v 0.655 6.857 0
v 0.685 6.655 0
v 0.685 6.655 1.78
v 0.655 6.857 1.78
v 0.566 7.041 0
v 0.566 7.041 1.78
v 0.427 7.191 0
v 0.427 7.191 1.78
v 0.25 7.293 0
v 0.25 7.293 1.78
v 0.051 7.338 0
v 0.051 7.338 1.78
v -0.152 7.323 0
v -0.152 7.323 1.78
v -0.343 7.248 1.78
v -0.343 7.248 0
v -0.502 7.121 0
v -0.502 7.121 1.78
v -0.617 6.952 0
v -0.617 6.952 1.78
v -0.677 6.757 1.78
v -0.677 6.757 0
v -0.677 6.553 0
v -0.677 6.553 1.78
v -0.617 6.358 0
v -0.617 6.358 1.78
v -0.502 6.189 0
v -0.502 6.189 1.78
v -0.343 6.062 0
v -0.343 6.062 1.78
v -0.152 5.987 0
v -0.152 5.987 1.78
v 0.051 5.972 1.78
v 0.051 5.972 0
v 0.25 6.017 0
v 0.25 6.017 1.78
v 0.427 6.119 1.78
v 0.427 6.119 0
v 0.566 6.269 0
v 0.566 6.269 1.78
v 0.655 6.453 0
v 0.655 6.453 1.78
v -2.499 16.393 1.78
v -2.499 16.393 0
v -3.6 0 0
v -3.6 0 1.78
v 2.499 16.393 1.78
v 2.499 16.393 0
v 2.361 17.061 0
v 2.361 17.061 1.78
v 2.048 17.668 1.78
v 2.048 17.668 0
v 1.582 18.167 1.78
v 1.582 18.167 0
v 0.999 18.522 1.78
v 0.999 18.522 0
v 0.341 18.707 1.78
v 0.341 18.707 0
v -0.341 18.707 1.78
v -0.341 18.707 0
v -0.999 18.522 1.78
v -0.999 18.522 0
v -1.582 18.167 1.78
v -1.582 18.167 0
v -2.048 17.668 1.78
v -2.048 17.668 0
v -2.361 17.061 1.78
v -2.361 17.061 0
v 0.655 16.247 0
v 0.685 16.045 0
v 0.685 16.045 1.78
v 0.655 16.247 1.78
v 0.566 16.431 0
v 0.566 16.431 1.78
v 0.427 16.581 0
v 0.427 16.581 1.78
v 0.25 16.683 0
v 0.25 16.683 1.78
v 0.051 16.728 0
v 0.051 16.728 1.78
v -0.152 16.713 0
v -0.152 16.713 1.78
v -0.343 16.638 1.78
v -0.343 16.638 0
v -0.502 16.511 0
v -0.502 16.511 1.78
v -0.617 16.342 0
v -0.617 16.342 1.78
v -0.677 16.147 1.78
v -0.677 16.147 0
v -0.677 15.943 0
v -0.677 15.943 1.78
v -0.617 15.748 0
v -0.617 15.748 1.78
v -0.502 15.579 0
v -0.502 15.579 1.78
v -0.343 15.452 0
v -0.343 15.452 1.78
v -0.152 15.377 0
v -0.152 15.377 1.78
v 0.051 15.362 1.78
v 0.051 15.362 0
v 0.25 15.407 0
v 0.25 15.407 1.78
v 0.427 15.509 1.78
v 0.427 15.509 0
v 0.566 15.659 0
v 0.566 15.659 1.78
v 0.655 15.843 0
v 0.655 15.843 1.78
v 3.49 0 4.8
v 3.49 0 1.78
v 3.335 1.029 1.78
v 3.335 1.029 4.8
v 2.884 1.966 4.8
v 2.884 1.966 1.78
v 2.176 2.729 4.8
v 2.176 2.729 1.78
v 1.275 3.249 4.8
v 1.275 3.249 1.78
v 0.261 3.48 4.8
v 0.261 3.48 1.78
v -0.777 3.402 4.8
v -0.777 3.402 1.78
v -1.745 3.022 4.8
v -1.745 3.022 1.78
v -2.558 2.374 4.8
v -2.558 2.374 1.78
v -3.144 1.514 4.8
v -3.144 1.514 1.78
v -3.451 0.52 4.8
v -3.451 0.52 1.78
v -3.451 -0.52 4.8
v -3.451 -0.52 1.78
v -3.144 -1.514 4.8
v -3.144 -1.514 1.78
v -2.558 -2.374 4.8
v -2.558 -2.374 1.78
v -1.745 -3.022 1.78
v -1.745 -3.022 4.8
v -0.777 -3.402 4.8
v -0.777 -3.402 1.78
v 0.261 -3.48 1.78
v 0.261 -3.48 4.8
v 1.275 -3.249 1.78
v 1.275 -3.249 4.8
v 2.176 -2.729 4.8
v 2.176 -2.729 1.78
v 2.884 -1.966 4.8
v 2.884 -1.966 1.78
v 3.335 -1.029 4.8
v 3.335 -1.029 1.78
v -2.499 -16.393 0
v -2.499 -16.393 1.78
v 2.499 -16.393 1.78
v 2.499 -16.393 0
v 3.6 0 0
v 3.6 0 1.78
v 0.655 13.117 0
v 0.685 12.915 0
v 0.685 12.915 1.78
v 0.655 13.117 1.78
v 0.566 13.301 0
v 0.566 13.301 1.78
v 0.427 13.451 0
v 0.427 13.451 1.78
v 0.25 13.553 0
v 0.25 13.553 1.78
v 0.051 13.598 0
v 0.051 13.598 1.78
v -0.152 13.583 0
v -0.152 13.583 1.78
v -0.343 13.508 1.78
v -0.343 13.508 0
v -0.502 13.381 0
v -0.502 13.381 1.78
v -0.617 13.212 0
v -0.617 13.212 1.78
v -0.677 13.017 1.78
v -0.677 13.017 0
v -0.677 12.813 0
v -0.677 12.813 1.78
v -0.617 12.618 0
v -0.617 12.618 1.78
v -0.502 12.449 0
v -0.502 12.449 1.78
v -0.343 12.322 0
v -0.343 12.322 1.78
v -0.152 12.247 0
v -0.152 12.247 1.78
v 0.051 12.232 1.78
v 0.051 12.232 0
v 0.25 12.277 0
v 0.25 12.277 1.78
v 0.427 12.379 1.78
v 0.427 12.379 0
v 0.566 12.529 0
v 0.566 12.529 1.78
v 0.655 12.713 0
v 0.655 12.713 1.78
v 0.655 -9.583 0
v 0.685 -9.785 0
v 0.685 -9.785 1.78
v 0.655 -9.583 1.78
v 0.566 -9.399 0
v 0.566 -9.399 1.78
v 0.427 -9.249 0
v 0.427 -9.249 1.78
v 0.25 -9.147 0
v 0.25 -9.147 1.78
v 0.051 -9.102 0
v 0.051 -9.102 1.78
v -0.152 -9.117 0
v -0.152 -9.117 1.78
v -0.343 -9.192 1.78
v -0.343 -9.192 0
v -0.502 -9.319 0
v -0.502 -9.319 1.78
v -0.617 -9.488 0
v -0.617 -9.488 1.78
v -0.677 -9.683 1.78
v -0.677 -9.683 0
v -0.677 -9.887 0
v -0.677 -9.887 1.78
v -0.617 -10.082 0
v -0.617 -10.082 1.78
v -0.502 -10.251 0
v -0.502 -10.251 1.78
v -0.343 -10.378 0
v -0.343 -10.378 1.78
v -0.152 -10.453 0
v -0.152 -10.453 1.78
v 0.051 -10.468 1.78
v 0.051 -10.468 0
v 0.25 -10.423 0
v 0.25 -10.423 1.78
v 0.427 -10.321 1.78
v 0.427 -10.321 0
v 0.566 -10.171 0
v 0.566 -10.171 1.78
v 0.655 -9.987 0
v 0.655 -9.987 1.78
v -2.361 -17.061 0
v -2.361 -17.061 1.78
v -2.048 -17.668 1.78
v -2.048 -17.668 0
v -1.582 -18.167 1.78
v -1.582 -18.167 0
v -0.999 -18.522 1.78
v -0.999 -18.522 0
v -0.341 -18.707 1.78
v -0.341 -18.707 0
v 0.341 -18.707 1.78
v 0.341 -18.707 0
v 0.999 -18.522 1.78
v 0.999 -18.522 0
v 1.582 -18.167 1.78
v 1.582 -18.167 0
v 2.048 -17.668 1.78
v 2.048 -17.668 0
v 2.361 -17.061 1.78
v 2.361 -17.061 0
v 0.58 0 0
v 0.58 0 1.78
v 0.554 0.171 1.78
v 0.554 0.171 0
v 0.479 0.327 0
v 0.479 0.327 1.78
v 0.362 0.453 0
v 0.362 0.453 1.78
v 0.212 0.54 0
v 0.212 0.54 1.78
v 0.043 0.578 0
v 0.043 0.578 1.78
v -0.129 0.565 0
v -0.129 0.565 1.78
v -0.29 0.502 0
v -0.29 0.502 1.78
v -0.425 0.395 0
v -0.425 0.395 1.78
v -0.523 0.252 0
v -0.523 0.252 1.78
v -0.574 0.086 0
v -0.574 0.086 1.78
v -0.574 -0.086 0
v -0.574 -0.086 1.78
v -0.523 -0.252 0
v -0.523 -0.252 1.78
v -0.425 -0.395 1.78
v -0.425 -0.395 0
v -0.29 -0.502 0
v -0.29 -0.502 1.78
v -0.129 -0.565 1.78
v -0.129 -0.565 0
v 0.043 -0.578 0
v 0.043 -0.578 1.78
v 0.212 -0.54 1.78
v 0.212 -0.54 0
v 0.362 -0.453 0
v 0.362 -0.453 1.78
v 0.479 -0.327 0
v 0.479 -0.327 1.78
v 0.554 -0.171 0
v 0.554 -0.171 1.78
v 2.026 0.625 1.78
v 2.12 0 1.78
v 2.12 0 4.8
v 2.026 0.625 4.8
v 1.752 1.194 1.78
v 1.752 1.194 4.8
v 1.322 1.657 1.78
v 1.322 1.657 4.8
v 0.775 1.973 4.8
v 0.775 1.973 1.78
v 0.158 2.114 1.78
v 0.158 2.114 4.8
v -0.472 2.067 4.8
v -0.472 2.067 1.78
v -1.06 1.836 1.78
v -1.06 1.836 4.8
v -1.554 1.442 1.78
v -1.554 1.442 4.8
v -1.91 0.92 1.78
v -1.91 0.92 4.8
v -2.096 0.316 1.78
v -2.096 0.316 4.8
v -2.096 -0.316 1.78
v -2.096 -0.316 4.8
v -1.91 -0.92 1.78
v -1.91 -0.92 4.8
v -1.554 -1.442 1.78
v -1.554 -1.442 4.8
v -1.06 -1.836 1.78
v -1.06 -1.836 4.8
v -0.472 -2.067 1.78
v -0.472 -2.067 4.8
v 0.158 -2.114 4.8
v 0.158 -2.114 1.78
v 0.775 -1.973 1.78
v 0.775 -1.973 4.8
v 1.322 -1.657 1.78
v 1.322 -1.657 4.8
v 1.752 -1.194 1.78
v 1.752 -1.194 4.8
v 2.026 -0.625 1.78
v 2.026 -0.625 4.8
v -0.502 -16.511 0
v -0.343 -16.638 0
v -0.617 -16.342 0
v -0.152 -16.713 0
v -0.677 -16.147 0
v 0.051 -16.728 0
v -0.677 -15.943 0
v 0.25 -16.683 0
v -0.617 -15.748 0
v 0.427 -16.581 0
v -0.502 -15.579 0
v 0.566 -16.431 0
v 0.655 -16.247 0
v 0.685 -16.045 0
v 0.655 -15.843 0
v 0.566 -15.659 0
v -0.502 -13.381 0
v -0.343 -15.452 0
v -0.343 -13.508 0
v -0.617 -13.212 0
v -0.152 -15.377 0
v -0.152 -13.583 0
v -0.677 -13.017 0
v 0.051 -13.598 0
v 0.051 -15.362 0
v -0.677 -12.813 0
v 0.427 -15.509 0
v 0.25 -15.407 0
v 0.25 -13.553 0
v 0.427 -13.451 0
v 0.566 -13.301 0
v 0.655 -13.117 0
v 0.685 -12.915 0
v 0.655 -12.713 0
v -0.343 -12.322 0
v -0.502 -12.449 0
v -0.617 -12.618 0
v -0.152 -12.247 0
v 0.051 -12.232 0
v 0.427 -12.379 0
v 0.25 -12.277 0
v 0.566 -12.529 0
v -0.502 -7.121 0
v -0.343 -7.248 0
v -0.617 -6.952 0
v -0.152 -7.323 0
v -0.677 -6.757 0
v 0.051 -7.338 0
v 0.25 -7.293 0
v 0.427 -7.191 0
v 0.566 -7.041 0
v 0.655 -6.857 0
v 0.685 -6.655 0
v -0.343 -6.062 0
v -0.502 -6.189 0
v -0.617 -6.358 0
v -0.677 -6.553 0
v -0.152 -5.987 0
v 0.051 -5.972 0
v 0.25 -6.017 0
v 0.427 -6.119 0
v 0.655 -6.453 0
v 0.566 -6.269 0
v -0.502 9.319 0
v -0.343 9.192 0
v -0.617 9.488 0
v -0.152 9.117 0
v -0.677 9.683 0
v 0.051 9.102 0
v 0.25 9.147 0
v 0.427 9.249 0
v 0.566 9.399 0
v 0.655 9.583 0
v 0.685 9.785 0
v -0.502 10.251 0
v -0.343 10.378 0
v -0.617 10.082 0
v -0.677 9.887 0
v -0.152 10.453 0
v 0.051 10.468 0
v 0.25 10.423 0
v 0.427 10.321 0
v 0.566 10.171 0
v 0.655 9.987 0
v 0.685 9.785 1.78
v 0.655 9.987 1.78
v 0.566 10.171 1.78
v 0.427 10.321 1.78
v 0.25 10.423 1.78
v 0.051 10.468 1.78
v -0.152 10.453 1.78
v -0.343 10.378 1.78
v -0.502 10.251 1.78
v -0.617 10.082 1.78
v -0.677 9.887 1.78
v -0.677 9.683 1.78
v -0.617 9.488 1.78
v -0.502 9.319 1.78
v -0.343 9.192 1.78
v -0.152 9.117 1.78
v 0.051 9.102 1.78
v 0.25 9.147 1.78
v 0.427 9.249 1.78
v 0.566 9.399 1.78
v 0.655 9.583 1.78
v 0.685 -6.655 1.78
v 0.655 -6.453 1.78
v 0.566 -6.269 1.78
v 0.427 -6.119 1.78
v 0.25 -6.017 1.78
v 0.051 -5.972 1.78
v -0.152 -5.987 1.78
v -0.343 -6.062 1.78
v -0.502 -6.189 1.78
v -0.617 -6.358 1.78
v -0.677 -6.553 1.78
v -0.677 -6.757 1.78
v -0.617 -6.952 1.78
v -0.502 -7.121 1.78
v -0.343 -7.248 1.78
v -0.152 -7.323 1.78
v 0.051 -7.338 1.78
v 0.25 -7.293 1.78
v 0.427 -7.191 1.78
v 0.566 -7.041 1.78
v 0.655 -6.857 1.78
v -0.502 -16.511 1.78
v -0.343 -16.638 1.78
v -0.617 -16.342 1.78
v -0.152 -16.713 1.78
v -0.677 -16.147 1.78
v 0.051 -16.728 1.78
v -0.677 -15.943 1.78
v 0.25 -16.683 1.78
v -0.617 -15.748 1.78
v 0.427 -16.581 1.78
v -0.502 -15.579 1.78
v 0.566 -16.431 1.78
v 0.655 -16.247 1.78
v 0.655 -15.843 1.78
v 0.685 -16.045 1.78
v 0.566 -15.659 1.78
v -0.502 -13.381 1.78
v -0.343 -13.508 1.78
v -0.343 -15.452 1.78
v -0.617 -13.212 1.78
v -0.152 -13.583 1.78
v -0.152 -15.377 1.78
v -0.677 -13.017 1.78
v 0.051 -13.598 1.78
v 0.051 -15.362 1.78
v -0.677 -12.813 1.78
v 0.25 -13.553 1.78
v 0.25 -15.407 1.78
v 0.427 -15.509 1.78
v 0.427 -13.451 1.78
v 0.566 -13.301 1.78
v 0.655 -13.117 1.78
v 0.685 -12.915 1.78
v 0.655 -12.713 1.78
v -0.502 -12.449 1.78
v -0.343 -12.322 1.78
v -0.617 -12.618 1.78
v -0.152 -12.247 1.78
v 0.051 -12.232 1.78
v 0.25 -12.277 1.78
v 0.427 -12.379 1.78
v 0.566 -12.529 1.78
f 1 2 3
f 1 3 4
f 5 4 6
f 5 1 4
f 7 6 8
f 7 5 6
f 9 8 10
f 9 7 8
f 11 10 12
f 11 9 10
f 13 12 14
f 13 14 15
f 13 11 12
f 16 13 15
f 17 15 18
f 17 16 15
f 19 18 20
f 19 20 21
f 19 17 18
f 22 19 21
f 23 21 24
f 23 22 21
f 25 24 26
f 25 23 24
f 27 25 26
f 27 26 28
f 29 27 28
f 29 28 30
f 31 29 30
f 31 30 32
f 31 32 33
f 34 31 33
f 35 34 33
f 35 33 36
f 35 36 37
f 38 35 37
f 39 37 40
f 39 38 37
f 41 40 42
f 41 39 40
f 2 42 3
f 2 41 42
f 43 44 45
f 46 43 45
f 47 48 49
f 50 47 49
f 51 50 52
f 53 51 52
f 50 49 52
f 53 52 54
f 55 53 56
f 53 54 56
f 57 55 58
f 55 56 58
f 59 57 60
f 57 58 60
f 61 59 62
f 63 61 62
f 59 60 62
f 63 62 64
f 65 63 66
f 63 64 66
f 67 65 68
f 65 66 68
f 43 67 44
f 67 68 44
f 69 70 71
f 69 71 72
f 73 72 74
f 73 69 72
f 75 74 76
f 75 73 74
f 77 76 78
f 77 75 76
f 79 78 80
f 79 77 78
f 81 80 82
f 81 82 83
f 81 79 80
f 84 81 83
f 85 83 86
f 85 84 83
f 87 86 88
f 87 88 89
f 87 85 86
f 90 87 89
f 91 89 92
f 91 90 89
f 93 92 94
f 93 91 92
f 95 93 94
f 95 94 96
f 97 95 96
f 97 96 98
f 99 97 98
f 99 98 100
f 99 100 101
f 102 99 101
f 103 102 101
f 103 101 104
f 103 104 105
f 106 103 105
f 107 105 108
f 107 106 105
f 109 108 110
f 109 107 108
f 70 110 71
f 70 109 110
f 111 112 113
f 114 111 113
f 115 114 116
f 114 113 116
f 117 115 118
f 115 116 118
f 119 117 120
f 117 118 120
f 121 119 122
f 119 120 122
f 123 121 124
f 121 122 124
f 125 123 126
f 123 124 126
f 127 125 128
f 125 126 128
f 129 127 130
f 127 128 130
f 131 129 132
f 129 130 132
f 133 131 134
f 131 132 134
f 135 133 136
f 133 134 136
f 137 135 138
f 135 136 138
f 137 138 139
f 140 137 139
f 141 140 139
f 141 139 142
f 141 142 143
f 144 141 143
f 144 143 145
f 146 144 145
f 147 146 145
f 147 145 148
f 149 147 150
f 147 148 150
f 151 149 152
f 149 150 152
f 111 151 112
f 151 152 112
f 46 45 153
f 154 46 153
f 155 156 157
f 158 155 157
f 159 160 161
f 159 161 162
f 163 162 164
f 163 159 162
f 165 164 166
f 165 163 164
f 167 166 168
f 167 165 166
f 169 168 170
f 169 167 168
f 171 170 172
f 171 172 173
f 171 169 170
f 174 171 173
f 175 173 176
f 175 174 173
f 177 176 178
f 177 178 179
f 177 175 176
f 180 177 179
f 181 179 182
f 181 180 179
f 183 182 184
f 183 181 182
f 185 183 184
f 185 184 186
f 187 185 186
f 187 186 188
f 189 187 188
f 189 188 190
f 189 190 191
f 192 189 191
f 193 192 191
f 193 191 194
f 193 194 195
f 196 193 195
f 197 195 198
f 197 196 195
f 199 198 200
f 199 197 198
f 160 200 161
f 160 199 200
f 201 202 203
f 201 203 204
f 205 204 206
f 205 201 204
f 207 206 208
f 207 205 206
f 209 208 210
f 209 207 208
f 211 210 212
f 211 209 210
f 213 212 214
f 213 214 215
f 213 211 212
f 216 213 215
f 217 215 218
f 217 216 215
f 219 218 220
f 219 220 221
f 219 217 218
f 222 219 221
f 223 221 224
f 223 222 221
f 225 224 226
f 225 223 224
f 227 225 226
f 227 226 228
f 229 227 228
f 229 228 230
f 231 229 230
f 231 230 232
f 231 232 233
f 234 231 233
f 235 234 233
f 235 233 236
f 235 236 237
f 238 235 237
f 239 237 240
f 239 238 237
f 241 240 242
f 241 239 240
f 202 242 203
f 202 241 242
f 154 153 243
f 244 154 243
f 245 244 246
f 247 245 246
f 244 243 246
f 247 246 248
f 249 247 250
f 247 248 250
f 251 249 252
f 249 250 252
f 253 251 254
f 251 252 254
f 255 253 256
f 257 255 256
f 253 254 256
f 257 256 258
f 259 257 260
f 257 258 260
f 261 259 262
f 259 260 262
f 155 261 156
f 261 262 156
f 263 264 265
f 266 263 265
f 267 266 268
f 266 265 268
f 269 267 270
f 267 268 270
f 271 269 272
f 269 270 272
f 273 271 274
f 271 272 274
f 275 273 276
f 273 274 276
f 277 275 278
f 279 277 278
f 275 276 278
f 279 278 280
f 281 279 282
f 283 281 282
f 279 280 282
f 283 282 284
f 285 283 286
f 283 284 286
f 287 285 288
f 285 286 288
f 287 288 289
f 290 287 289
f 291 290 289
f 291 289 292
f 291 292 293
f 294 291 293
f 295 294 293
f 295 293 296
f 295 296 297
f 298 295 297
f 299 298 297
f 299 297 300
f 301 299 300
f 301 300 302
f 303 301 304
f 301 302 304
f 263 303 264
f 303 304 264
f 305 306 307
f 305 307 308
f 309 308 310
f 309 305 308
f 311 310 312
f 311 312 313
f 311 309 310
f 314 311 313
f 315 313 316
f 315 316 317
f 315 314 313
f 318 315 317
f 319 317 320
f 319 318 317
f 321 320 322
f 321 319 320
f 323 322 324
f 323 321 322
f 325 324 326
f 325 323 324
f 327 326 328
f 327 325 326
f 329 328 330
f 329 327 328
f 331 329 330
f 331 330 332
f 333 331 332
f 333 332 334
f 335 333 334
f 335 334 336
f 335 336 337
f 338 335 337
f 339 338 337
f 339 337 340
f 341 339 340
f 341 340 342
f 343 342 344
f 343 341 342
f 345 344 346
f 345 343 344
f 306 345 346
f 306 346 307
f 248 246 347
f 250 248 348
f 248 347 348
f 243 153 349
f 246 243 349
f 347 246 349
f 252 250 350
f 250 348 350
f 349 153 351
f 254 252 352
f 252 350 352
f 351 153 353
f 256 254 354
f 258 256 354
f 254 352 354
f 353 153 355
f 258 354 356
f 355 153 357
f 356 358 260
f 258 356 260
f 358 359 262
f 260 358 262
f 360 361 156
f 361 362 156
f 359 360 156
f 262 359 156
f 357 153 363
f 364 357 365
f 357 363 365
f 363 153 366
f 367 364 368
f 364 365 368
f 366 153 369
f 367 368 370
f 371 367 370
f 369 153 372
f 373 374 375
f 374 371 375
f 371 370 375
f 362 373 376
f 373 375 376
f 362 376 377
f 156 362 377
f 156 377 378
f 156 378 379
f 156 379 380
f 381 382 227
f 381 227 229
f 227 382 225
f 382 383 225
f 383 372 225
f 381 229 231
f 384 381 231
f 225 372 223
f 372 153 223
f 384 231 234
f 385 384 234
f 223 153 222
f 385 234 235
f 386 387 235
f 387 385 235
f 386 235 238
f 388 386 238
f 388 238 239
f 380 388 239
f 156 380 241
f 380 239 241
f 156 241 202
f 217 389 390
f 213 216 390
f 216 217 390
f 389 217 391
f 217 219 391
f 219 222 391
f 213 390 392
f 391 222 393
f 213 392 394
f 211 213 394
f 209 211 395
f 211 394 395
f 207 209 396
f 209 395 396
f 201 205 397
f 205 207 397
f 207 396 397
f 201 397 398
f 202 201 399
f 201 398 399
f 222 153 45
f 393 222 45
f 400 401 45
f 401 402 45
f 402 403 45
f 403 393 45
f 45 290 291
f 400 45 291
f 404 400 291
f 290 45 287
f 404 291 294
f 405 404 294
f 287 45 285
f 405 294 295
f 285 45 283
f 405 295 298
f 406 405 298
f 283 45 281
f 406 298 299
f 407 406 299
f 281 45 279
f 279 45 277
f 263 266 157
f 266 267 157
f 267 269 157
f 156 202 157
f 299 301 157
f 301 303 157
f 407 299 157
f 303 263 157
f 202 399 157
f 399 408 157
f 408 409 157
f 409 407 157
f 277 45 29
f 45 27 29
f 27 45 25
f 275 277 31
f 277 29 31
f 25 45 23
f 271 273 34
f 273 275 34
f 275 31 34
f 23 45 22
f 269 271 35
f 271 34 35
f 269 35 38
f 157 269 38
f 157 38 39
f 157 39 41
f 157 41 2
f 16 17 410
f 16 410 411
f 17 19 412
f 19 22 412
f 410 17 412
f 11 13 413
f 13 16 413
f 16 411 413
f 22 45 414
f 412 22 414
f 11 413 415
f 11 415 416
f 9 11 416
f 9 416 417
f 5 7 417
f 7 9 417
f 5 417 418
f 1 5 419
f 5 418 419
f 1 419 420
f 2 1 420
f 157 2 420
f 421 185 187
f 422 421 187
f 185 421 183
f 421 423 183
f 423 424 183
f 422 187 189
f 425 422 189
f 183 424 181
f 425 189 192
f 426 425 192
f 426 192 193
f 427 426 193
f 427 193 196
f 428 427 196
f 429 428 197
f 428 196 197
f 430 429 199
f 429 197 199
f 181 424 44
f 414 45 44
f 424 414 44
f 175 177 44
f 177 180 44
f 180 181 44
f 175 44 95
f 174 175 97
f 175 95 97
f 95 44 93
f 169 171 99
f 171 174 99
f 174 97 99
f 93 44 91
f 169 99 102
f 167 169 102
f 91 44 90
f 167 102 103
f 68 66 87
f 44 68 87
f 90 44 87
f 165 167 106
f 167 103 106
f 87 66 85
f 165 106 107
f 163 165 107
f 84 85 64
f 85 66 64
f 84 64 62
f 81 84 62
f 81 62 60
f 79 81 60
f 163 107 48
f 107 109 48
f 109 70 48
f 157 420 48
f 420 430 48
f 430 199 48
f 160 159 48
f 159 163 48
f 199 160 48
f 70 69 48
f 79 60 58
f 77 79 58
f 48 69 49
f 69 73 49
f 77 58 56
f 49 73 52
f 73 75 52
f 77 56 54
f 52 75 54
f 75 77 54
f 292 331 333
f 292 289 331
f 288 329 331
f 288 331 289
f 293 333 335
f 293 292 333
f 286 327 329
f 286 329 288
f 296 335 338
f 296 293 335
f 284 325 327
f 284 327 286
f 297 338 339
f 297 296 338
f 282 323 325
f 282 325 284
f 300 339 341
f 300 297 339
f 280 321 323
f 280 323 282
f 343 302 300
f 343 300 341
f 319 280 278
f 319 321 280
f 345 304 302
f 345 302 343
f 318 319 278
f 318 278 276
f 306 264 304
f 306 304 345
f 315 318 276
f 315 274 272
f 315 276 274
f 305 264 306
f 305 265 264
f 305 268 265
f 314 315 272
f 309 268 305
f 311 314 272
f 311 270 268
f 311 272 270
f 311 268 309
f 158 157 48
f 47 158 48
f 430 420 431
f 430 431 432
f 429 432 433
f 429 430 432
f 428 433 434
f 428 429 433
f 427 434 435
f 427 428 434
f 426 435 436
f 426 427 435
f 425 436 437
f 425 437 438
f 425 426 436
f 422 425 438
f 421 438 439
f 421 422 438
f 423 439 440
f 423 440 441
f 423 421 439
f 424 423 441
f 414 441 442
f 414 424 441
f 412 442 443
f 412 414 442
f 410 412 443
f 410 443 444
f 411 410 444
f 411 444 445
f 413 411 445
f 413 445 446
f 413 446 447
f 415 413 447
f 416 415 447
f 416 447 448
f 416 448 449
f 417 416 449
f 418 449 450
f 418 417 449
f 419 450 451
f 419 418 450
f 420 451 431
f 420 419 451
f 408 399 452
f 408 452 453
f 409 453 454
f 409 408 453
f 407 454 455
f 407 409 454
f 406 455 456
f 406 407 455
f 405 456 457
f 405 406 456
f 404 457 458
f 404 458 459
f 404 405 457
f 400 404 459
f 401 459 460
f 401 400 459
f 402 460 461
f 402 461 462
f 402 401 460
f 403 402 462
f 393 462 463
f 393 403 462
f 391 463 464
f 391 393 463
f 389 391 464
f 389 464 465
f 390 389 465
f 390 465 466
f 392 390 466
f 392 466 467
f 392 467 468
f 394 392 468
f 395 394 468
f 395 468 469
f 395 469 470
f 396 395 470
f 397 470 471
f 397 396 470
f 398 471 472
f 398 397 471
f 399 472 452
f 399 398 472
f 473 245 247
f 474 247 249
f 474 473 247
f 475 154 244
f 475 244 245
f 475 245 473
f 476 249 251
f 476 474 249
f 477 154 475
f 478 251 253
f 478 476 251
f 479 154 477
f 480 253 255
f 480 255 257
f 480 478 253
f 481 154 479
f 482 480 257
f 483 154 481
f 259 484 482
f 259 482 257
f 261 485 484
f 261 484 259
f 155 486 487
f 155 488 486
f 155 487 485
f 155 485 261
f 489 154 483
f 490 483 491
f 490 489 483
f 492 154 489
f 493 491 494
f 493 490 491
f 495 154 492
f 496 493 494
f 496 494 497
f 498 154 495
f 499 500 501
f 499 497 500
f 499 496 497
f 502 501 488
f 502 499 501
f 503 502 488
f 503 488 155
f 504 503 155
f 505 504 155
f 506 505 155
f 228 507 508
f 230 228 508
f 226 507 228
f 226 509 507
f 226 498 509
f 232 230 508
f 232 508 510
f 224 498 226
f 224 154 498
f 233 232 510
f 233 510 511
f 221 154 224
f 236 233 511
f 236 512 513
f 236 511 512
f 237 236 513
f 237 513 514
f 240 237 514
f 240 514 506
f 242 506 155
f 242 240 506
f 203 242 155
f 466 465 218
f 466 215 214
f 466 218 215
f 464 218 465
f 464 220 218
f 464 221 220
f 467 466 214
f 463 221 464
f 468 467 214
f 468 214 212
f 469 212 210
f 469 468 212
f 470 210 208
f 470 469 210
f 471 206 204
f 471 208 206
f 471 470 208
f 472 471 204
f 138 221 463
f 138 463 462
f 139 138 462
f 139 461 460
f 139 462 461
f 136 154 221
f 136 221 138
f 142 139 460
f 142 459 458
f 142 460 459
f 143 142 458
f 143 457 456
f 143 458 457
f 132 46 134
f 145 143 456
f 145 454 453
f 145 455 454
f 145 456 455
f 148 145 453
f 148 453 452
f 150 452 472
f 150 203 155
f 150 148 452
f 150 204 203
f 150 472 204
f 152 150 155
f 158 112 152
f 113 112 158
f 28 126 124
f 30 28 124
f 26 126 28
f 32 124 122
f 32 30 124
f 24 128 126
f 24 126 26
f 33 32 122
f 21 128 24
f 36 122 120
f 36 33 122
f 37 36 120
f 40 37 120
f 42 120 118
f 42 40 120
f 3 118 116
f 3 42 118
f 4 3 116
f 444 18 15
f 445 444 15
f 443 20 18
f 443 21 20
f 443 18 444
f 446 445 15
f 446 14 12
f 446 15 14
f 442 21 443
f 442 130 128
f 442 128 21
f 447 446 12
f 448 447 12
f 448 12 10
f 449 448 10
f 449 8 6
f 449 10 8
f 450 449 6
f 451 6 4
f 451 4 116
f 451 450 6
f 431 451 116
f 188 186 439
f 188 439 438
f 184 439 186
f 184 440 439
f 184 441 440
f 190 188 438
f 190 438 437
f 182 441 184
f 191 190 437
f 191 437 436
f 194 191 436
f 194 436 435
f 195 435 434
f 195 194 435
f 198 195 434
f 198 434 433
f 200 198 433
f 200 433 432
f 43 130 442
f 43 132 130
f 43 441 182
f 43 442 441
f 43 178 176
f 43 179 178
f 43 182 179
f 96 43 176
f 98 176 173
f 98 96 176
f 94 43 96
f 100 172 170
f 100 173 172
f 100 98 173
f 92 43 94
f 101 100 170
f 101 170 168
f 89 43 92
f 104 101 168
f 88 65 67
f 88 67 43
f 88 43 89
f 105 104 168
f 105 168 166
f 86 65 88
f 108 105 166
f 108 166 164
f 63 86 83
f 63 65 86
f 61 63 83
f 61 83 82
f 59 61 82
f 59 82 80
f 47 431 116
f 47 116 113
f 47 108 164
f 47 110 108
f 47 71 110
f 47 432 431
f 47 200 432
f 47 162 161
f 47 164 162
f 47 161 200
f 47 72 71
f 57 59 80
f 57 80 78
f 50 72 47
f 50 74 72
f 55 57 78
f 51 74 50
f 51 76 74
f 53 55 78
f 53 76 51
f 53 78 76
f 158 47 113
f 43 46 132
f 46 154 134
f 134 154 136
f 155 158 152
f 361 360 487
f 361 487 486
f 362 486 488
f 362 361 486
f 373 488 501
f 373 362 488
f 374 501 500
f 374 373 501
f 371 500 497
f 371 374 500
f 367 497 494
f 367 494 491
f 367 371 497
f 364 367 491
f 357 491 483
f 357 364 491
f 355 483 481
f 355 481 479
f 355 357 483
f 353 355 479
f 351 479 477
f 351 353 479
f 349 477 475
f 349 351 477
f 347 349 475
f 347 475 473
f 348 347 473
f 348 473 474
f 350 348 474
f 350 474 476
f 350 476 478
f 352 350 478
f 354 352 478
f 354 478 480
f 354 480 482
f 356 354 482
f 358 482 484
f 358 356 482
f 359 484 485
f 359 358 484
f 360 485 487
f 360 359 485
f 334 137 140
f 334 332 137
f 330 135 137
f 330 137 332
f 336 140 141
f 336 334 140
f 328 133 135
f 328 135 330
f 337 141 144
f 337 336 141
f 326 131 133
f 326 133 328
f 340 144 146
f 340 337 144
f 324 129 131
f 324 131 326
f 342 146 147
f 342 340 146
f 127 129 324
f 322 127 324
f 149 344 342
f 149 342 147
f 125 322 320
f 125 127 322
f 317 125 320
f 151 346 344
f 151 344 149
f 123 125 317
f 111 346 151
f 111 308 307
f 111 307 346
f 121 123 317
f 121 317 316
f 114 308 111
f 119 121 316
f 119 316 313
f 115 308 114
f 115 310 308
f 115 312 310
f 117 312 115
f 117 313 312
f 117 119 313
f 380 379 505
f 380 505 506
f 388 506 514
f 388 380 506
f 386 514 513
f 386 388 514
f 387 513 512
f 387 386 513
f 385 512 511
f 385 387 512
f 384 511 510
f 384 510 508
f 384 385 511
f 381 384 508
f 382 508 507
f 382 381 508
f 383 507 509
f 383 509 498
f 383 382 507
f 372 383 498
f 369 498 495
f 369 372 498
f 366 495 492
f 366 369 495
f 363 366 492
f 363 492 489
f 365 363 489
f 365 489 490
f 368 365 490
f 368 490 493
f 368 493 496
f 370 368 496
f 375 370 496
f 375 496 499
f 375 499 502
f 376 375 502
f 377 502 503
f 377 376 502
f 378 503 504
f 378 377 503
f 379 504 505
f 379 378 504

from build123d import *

# Parameters (mm, degrees)
F0_R     = 0.685
F1_DEPTH = 1.78
F2_R     = 3.49
F2_R_2   = 2.12
F3_DEPTH = 3.02
F4_R     = 0.58
F5_DEPTH = 1.78


with BuildPart() as f1:
    # F0 (on Top) → F1 (new body)
    with BuildSketch(Plane.XY):
        with BuildLine():
            Line((3.6, 0), (2.4993728816, 16.3928100076))
            ThreePointArc((2.4993728816, 16.3928100076), (0, 18.73), (-2.4993728816, 16.3928100076))
            Line((-2.4993728816, 16.3928100076), (-3.6, 0))
            Line((-3.6, 0), (-2.4993728816, -16.3928100076))
            ThreePointArc((-2.4993728816, -16.3928100076), (0, -18.73), (2.4993728816, -16.3928100076))
            Line((2.4993728816, -16.3928100076), (3.6, 0))
        make_face()
        with Locations((0, -16.045)):
            Circle(F0_R, mode=Mode.SUBTRACT)
        with Locations((0, -12.915)):
            Circle(F0_R, mode=Mode.SUBTRACT)
        with Locations((0, -9.785)):
            Circle(F0_R, mode=Mode.SUBTRACT)
        with Locations((0, -6.655)):
            Circle(F0_R, mode=Mode.SUBTRACT)
        with Locations((0, 6.655)):
            Circle(F0_R, mode=Mode.SUBTRACT)
        with Locations((0, 9.785)):
            Circle(F0_R, mode=Mode.SUBTRACT)
        with Locations((0, 12.915)):
            Circle(F0_R, mode=Mode.SUBTRACT)
        with Locations((0, 16.045)):
            Circle(F0_R, mode=Mode.SUBTRACT)
    extrude(amount=F1_DEPTH)

    # F2 (on face) → F3 (join)
    with BuildSketch(Plane.XY.offset(1.78)):
        Circle(F2_R)
        Circle(F2_R_2, mode=Mode.SUBTRACT)
    extrude(amount=F3_DEPTH)

    # F4 (on face) → F5 (cut, through all)
    with BuildSketch(Plane.XY.offset(1.78)):
        Circle(F4_R)
    extrude(amount=-F5_DEPTH, mode=Mode.SUBTRACT)


solid = f1.part
